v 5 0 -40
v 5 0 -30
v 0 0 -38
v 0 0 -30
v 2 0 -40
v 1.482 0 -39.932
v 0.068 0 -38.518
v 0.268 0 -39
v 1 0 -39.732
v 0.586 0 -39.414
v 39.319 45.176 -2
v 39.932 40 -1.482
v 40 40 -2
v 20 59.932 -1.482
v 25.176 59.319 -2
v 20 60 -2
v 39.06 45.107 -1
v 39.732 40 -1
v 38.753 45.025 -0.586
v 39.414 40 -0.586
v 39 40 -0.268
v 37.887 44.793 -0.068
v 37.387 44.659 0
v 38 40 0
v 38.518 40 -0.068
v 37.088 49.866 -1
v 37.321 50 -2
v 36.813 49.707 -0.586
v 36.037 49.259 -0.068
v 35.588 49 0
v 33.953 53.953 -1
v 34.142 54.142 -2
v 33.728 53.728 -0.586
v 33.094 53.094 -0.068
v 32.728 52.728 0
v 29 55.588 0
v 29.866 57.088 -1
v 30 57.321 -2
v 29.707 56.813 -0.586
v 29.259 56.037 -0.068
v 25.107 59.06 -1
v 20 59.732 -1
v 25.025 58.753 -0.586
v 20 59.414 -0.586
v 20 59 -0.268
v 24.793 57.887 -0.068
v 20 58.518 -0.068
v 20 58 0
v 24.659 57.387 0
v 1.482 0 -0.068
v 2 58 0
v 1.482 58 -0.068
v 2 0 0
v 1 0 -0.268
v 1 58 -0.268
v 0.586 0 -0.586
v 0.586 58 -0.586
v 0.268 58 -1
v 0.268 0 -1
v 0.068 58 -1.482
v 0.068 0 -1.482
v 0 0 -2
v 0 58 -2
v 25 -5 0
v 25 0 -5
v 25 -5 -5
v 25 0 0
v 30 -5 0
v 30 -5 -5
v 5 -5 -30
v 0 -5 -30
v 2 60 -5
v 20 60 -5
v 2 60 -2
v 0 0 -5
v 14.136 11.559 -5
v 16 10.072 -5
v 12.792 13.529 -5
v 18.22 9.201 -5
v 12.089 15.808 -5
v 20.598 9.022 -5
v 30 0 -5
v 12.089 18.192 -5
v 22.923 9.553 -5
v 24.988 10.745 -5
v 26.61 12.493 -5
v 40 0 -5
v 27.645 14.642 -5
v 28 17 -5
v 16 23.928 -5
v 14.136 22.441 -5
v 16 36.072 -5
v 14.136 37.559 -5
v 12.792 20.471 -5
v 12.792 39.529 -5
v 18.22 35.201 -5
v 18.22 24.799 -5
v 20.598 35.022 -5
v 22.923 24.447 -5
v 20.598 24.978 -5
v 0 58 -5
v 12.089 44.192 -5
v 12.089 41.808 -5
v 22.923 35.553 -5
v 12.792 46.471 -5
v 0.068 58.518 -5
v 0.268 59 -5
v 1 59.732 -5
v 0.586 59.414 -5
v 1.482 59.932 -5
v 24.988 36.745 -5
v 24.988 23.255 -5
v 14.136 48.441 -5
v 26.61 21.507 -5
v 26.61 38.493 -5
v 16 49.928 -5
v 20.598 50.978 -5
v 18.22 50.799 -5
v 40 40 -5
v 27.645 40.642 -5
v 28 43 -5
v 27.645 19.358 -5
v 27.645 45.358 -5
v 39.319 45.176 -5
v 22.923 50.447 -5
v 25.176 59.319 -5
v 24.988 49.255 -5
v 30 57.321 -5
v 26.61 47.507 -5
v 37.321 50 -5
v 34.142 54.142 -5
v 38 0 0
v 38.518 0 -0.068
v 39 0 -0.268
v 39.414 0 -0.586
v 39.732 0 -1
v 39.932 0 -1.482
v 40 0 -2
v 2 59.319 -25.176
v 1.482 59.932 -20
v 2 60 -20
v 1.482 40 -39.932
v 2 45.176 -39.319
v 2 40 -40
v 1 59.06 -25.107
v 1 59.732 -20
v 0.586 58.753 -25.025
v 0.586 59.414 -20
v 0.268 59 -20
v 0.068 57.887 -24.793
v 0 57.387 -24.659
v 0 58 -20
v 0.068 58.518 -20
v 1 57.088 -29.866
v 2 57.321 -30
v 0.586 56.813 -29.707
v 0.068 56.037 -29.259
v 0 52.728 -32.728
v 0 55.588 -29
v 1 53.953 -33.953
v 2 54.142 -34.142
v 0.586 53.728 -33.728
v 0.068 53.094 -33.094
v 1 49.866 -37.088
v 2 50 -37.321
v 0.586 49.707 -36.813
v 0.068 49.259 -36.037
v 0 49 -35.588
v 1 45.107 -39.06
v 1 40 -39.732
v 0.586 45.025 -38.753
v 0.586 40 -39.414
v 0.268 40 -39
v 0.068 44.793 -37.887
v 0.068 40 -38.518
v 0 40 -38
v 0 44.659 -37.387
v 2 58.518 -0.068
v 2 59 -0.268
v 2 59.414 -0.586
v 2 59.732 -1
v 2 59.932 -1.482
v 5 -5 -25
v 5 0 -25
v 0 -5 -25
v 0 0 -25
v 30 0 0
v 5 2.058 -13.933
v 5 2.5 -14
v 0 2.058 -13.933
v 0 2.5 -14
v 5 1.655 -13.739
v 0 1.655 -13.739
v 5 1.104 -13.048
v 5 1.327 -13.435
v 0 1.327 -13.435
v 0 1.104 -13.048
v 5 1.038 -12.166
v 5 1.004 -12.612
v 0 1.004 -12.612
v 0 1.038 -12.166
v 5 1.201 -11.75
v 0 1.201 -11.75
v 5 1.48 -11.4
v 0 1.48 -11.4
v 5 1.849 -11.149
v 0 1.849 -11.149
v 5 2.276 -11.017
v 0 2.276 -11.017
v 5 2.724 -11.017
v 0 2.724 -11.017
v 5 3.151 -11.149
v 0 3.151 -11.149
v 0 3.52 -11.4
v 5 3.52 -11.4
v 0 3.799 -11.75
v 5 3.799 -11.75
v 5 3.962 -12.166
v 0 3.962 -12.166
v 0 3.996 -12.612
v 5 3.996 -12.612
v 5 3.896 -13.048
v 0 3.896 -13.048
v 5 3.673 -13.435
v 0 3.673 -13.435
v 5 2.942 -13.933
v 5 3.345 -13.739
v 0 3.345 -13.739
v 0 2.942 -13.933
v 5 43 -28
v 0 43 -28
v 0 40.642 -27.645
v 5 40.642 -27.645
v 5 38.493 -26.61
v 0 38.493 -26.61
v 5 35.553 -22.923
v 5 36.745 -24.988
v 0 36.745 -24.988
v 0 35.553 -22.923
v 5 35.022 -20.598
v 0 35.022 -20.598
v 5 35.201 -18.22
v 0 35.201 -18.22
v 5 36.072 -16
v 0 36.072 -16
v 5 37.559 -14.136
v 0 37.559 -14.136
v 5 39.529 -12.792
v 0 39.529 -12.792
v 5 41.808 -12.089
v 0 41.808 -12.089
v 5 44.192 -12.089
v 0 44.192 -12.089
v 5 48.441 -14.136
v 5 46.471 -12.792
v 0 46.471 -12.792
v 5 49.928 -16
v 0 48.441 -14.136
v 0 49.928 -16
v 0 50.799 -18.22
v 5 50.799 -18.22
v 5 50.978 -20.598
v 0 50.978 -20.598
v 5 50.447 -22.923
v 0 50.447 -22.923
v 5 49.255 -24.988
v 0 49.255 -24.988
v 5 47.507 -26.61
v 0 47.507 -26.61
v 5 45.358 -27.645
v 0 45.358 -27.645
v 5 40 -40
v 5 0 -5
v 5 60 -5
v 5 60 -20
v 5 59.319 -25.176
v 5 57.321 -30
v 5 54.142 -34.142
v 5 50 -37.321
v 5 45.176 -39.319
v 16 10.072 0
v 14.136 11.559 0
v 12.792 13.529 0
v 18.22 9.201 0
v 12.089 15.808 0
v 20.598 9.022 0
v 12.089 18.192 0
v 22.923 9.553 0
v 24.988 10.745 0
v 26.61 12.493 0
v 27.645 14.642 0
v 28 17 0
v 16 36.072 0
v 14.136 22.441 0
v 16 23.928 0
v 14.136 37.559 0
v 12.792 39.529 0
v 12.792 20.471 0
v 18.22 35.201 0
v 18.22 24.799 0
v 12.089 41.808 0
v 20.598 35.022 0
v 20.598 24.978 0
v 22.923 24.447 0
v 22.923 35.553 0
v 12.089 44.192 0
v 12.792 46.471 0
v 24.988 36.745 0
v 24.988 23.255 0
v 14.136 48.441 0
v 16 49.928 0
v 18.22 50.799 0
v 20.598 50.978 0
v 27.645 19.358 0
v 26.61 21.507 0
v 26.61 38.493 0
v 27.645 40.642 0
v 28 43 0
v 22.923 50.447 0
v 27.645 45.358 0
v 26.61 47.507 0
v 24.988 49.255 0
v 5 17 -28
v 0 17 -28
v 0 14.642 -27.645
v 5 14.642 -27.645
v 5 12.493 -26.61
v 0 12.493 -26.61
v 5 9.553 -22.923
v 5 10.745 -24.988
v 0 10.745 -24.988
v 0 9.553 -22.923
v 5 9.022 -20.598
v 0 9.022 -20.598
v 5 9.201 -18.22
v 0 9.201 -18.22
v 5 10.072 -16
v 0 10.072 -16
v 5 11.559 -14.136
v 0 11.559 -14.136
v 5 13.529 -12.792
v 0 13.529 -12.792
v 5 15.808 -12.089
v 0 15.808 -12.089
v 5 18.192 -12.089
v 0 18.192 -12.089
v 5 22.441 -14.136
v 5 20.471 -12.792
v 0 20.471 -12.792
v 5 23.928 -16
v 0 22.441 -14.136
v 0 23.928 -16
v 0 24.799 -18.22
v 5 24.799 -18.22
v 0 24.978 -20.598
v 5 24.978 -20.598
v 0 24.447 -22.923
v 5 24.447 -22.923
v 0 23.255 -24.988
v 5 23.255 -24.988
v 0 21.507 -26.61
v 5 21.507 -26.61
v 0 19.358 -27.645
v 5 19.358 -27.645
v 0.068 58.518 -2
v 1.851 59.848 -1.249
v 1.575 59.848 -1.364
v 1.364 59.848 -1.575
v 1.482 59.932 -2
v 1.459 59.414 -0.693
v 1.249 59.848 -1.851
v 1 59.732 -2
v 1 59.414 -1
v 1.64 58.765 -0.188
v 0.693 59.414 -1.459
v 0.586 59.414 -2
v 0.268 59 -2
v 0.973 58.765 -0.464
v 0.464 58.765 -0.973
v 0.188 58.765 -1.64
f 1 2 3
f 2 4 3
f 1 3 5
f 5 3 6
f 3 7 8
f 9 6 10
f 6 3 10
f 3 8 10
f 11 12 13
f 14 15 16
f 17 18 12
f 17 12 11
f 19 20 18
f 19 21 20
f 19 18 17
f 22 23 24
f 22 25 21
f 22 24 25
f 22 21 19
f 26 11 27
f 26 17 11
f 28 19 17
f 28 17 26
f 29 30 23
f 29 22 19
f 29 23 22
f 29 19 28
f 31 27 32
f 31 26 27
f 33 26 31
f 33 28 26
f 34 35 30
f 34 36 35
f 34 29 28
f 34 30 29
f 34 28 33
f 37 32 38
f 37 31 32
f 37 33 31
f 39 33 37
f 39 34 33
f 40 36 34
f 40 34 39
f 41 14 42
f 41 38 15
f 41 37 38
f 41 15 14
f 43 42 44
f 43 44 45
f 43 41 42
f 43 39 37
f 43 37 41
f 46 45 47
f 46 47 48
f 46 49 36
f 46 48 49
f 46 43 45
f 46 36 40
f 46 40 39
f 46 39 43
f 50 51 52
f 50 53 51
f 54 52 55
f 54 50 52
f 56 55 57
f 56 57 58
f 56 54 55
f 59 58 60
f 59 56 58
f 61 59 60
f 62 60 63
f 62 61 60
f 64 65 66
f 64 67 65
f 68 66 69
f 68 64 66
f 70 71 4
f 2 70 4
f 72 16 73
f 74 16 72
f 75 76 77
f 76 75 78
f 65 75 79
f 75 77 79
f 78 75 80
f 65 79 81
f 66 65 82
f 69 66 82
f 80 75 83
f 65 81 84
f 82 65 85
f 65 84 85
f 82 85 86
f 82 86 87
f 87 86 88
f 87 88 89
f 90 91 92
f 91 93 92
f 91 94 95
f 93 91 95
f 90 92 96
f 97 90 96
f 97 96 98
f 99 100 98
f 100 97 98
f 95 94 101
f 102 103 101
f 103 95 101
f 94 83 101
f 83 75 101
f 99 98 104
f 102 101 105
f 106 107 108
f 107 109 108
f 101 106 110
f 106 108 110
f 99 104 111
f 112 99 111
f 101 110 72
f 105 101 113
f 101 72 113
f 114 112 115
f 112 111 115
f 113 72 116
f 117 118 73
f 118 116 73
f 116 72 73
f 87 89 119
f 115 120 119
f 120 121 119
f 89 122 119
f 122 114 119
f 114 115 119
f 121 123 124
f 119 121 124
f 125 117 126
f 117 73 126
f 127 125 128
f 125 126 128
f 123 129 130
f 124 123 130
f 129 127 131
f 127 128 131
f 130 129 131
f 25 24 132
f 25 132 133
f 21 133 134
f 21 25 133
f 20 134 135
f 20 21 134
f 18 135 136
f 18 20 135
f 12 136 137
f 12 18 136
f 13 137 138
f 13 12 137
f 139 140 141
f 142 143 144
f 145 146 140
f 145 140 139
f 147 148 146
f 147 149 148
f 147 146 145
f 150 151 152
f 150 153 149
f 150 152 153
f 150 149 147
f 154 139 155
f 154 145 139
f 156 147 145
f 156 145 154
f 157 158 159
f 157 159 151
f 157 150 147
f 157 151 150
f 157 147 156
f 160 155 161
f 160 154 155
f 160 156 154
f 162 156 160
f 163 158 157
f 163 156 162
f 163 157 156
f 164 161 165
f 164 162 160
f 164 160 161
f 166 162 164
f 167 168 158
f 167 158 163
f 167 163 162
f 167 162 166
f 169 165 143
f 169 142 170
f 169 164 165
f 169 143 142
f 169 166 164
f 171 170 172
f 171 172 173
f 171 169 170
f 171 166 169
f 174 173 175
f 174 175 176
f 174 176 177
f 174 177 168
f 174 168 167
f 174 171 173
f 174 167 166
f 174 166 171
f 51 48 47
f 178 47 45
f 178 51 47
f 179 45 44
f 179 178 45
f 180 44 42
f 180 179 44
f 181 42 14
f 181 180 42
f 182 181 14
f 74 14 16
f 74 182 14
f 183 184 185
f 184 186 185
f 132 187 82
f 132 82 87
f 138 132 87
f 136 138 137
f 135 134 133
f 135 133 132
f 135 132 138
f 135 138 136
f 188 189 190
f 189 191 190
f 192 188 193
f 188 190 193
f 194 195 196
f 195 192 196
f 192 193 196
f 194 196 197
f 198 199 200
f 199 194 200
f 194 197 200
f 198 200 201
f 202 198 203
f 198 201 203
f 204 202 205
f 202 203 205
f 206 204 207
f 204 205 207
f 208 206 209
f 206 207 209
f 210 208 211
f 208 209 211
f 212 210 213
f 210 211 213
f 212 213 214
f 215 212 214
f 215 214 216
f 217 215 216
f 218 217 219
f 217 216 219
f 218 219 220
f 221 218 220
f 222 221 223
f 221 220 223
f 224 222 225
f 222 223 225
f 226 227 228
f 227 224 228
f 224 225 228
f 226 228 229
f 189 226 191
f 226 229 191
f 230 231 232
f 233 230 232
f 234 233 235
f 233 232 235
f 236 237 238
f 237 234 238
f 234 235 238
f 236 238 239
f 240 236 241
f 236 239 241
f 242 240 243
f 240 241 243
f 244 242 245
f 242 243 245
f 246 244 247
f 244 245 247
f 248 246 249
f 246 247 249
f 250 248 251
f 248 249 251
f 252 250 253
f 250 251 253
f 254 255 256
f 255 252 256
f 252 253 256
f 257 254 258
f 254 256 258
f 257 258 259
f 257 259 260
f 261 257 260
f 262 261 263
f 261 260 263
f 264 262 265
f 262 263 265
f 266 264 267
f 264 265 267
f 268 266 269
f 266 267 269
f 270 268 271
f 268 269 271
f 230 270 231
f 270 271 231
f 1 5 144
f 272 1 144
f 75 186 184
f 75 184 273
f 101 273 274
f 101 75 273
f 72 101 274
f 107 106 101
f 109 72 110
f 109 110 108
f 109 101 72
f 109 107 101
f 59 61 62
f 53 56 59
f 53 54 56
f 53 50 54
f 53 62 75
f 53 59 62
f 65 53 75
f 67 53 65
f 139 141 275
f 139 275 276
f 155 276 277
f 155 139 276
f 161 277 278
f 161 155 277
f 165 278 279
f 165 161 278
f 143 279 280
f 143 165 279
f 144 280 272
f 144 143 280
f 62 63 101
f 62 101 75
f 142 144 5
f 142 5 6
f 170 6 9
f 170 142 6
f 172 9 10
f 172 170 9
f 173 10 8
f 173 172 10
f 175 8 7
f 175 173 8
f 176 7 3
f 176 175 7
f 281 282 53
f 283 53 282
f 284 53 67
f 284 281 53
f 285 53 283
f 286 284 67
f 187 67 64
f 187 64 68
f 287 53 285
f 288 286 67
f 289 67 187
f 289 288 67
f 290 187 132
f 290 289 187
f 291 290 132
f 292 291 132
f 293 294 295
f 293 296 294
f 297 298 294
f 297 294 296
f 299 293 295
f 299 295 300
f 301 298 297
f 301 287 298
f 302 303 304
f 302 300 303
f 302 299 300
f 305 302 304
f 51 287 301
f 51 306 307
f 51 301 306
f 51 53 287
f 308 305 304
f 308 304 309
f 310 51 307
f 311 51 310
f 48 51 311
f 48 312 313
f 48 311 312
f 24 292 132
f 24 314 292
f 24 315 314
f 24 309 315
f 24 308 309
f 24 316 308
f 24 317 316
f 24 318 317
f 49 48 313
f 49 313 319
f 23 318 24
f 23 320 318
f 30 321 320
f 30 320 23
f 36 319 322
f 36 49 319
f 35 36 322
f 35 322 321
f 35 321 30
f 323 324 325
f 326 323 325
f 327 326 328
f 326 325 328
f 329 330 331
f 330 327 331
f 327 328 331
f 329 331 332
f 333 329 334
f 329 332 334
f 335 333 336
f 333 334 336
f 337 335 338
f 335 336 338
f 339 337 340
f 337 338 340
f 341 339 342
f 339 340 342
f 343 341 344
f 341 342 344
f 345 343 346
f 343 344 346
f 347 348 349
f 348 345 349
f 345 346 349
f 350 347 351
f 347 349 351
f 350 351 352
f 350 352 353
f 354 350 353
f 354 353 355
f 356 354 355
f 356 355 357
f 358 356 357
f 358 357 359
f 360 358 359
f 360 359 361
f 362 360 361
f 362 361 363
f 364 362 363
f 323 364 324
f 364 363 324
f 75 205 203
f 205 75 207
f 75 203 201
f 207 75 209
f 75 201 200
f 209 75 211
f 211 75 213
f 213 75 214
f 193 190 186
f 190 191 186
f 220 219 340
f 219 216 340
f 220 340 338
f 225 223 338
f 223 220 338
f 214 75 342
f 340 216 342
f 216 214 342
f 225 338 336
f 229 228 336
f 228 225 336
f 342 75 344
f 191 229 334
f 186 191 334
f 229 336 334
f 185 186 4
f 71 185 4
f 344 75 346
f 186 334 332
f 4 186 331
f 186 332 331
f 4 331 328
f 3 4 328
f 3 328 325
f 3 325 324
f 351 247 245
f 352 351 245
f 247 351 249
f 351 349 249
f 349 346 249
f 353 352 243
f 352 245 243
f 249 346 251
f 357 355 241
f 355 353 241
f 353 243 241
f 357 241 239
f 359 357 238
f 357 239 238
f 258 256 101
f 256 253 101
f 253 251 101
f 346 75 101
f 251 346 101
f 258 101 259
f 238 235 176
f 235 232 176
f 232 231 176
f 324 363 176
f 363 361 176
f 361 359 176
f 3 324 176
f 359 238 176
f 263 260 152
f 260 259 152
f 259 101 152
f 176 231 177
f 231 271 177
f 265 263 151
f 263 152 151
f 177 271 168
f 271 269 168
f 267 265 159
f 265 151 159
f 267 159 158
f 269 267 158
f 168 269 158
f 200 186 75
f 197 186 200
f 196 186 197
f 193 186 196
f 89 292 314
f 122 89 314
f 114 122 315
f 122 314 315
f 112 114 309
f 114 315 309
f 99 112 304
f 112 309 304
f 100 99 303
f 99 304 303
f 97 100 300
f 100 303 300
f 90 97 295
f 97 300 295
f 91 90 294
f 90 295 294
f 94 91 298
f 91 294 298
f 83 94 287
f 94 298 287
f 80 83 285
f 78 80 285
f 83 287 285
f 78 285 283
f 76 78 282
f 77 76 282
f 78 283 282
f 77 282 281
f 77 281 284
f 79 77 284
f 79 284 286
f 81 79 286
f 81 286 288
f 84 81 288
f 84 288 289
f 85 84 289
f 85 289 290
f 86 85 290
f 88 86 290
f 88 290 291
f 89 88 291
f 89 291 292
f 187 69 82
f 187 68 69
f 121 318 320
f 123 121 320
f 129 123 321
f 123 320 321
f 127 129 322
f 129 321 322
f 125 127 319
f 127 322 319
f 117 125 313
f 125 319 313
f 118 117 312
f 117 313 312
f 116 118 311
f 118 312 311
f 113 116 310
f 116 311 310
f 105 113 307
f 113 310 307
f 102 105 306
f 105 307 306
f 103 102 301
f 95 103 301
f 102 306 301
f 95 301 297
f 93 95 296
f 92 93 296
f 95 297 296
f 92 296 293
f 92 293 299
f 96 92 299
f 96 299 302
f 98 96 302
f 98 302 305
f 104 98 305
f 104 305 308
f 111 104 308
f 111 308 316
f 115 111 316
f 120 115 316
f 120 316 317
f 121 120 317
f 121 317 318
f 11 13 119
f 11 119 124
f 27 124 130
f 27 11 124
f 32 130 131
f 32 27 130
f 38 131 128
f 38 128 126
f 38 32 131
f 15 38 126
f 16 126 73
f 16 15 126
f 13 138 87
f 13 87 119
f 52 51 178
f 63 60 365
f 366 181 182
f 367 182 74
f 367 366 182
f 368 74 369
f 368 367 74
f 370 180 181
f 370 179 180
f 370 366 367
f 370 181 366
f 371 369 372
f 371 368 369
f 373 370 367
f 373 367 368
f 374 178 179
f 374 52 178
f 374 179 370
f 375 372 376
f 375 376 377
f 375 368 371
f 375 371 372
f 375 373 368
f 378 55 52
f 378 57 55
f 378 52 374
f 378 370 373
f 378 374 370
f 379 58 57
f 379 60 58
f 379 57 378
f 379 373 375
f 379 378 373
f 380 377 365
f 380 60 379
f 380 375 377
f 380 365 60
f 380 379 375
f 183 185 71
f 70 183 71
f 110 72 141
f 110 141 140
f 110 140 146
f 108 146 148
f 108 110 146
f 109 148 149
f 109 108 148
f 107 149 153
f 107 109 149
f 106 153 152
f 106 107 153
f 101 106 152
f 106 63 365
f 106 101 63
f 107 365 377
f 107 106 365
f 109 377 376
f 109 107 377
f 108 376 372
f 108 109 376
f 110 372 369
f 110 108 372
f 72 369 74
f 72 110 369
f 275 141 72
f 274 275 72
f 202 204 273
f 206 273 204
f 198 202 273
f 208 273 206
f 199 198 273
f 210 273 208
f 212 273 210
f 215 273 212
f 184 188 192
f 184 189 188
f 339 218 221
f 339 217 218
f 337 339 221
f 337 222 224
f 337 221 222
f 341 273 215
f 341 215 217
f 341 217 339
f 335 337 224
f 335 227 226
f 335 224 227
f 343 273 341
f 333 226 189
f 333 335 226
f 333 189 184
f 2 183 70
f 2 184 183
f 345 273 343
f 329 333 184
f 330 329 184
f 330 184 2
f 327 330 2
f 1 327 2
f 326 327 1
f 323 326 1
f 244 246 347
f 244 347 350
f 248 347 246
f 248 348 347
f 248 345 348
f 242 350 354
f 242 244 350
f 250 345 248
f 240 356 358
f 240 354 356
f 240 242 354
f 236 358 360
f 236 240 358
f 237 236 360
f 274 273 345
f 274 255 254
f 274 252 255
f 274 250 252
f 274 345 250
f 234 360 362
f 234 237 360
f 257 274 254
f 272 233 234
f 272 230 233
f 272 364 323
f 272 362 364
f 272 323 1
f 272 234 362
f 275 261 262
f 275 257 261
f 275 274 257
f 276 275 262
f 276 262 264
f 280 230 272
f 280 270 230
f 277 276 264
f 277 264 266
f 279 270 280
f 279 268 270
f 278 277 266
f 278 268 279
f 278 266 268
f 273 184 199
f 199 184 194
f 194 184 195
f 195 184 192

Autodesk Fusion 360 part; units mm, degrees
sketch "Sketch5" plane through (0, 0, 0) normal (1, 0, 0) x (0, 0, -1)
  line L0 (25, 0) -> (25, -5)
  line L1 (25, -5) -> (30, -5)
  line L2 (30, -5) -> (30, 0)
  line L3 (30, 0) -> (35, 0)
  line L4 (35, 0) -> (40, 0)
  circle A0 centre (12.5, 2.5) radius 1.5
  circle A1 centre (20, 43) radius 8
  circle A2 centre (20, 17) radius 8
  line L5 (40, 0) -> (40, 40)
  line L6 (20, 60) -> (5, 60)
  arc A3 (40, 40) -> (20, 60) centre (20, 40) ccw
  line L7 (5, 0) -> (5, 60)
  line L8 (25, 0) -> (5, 0)
  dimension "d18" = 3
  dimension "d19" = 20
extrude "Extrude6" add sketch "Sketch5" along normal blind 5 makes body 1
sketch "Sketch6" plane through (0, 0, 0) normal (0, 0, 1) x (1, 0, 0)
  line L0 (25, -5) -> (30, -5)
  line L1 (0, 60) -> (0, 0)
  line L2 (30, 0) -> (35, 0)
  arc A0 (40, 40) -> (20, 60) centre (20, 40) ccw
  line L3 (20, 60) -> (0, 60)
  line L4 (35, 0) -> (40, 0)
  circle A1 centre (20, 43) radius 8
  line L5 (0, 0) -> (25, 0)
  line L6 (25, 0) -> (25, -5)
  line L7 (30, -5) -> (30, 0)
  circle A2 centre (20, 17) radius 8
  line L8 (40, 0) -> (40, 40)
  dimension "d21" = 20
extrude "Extrude5" add sketch "Sketch6" against normal blind 5 separate body makes body 2
fillet "Fillet1" radius 2 8 edges at (0, 30, 0) (40, 20, 0) (34.1421, 54.1421, 0) (10, 60, 0) (0, 60, -2.5) (0, 20, -40) (0, 54.1421, -34.1421) (0, 60, -12.5) on bodies 1 2
